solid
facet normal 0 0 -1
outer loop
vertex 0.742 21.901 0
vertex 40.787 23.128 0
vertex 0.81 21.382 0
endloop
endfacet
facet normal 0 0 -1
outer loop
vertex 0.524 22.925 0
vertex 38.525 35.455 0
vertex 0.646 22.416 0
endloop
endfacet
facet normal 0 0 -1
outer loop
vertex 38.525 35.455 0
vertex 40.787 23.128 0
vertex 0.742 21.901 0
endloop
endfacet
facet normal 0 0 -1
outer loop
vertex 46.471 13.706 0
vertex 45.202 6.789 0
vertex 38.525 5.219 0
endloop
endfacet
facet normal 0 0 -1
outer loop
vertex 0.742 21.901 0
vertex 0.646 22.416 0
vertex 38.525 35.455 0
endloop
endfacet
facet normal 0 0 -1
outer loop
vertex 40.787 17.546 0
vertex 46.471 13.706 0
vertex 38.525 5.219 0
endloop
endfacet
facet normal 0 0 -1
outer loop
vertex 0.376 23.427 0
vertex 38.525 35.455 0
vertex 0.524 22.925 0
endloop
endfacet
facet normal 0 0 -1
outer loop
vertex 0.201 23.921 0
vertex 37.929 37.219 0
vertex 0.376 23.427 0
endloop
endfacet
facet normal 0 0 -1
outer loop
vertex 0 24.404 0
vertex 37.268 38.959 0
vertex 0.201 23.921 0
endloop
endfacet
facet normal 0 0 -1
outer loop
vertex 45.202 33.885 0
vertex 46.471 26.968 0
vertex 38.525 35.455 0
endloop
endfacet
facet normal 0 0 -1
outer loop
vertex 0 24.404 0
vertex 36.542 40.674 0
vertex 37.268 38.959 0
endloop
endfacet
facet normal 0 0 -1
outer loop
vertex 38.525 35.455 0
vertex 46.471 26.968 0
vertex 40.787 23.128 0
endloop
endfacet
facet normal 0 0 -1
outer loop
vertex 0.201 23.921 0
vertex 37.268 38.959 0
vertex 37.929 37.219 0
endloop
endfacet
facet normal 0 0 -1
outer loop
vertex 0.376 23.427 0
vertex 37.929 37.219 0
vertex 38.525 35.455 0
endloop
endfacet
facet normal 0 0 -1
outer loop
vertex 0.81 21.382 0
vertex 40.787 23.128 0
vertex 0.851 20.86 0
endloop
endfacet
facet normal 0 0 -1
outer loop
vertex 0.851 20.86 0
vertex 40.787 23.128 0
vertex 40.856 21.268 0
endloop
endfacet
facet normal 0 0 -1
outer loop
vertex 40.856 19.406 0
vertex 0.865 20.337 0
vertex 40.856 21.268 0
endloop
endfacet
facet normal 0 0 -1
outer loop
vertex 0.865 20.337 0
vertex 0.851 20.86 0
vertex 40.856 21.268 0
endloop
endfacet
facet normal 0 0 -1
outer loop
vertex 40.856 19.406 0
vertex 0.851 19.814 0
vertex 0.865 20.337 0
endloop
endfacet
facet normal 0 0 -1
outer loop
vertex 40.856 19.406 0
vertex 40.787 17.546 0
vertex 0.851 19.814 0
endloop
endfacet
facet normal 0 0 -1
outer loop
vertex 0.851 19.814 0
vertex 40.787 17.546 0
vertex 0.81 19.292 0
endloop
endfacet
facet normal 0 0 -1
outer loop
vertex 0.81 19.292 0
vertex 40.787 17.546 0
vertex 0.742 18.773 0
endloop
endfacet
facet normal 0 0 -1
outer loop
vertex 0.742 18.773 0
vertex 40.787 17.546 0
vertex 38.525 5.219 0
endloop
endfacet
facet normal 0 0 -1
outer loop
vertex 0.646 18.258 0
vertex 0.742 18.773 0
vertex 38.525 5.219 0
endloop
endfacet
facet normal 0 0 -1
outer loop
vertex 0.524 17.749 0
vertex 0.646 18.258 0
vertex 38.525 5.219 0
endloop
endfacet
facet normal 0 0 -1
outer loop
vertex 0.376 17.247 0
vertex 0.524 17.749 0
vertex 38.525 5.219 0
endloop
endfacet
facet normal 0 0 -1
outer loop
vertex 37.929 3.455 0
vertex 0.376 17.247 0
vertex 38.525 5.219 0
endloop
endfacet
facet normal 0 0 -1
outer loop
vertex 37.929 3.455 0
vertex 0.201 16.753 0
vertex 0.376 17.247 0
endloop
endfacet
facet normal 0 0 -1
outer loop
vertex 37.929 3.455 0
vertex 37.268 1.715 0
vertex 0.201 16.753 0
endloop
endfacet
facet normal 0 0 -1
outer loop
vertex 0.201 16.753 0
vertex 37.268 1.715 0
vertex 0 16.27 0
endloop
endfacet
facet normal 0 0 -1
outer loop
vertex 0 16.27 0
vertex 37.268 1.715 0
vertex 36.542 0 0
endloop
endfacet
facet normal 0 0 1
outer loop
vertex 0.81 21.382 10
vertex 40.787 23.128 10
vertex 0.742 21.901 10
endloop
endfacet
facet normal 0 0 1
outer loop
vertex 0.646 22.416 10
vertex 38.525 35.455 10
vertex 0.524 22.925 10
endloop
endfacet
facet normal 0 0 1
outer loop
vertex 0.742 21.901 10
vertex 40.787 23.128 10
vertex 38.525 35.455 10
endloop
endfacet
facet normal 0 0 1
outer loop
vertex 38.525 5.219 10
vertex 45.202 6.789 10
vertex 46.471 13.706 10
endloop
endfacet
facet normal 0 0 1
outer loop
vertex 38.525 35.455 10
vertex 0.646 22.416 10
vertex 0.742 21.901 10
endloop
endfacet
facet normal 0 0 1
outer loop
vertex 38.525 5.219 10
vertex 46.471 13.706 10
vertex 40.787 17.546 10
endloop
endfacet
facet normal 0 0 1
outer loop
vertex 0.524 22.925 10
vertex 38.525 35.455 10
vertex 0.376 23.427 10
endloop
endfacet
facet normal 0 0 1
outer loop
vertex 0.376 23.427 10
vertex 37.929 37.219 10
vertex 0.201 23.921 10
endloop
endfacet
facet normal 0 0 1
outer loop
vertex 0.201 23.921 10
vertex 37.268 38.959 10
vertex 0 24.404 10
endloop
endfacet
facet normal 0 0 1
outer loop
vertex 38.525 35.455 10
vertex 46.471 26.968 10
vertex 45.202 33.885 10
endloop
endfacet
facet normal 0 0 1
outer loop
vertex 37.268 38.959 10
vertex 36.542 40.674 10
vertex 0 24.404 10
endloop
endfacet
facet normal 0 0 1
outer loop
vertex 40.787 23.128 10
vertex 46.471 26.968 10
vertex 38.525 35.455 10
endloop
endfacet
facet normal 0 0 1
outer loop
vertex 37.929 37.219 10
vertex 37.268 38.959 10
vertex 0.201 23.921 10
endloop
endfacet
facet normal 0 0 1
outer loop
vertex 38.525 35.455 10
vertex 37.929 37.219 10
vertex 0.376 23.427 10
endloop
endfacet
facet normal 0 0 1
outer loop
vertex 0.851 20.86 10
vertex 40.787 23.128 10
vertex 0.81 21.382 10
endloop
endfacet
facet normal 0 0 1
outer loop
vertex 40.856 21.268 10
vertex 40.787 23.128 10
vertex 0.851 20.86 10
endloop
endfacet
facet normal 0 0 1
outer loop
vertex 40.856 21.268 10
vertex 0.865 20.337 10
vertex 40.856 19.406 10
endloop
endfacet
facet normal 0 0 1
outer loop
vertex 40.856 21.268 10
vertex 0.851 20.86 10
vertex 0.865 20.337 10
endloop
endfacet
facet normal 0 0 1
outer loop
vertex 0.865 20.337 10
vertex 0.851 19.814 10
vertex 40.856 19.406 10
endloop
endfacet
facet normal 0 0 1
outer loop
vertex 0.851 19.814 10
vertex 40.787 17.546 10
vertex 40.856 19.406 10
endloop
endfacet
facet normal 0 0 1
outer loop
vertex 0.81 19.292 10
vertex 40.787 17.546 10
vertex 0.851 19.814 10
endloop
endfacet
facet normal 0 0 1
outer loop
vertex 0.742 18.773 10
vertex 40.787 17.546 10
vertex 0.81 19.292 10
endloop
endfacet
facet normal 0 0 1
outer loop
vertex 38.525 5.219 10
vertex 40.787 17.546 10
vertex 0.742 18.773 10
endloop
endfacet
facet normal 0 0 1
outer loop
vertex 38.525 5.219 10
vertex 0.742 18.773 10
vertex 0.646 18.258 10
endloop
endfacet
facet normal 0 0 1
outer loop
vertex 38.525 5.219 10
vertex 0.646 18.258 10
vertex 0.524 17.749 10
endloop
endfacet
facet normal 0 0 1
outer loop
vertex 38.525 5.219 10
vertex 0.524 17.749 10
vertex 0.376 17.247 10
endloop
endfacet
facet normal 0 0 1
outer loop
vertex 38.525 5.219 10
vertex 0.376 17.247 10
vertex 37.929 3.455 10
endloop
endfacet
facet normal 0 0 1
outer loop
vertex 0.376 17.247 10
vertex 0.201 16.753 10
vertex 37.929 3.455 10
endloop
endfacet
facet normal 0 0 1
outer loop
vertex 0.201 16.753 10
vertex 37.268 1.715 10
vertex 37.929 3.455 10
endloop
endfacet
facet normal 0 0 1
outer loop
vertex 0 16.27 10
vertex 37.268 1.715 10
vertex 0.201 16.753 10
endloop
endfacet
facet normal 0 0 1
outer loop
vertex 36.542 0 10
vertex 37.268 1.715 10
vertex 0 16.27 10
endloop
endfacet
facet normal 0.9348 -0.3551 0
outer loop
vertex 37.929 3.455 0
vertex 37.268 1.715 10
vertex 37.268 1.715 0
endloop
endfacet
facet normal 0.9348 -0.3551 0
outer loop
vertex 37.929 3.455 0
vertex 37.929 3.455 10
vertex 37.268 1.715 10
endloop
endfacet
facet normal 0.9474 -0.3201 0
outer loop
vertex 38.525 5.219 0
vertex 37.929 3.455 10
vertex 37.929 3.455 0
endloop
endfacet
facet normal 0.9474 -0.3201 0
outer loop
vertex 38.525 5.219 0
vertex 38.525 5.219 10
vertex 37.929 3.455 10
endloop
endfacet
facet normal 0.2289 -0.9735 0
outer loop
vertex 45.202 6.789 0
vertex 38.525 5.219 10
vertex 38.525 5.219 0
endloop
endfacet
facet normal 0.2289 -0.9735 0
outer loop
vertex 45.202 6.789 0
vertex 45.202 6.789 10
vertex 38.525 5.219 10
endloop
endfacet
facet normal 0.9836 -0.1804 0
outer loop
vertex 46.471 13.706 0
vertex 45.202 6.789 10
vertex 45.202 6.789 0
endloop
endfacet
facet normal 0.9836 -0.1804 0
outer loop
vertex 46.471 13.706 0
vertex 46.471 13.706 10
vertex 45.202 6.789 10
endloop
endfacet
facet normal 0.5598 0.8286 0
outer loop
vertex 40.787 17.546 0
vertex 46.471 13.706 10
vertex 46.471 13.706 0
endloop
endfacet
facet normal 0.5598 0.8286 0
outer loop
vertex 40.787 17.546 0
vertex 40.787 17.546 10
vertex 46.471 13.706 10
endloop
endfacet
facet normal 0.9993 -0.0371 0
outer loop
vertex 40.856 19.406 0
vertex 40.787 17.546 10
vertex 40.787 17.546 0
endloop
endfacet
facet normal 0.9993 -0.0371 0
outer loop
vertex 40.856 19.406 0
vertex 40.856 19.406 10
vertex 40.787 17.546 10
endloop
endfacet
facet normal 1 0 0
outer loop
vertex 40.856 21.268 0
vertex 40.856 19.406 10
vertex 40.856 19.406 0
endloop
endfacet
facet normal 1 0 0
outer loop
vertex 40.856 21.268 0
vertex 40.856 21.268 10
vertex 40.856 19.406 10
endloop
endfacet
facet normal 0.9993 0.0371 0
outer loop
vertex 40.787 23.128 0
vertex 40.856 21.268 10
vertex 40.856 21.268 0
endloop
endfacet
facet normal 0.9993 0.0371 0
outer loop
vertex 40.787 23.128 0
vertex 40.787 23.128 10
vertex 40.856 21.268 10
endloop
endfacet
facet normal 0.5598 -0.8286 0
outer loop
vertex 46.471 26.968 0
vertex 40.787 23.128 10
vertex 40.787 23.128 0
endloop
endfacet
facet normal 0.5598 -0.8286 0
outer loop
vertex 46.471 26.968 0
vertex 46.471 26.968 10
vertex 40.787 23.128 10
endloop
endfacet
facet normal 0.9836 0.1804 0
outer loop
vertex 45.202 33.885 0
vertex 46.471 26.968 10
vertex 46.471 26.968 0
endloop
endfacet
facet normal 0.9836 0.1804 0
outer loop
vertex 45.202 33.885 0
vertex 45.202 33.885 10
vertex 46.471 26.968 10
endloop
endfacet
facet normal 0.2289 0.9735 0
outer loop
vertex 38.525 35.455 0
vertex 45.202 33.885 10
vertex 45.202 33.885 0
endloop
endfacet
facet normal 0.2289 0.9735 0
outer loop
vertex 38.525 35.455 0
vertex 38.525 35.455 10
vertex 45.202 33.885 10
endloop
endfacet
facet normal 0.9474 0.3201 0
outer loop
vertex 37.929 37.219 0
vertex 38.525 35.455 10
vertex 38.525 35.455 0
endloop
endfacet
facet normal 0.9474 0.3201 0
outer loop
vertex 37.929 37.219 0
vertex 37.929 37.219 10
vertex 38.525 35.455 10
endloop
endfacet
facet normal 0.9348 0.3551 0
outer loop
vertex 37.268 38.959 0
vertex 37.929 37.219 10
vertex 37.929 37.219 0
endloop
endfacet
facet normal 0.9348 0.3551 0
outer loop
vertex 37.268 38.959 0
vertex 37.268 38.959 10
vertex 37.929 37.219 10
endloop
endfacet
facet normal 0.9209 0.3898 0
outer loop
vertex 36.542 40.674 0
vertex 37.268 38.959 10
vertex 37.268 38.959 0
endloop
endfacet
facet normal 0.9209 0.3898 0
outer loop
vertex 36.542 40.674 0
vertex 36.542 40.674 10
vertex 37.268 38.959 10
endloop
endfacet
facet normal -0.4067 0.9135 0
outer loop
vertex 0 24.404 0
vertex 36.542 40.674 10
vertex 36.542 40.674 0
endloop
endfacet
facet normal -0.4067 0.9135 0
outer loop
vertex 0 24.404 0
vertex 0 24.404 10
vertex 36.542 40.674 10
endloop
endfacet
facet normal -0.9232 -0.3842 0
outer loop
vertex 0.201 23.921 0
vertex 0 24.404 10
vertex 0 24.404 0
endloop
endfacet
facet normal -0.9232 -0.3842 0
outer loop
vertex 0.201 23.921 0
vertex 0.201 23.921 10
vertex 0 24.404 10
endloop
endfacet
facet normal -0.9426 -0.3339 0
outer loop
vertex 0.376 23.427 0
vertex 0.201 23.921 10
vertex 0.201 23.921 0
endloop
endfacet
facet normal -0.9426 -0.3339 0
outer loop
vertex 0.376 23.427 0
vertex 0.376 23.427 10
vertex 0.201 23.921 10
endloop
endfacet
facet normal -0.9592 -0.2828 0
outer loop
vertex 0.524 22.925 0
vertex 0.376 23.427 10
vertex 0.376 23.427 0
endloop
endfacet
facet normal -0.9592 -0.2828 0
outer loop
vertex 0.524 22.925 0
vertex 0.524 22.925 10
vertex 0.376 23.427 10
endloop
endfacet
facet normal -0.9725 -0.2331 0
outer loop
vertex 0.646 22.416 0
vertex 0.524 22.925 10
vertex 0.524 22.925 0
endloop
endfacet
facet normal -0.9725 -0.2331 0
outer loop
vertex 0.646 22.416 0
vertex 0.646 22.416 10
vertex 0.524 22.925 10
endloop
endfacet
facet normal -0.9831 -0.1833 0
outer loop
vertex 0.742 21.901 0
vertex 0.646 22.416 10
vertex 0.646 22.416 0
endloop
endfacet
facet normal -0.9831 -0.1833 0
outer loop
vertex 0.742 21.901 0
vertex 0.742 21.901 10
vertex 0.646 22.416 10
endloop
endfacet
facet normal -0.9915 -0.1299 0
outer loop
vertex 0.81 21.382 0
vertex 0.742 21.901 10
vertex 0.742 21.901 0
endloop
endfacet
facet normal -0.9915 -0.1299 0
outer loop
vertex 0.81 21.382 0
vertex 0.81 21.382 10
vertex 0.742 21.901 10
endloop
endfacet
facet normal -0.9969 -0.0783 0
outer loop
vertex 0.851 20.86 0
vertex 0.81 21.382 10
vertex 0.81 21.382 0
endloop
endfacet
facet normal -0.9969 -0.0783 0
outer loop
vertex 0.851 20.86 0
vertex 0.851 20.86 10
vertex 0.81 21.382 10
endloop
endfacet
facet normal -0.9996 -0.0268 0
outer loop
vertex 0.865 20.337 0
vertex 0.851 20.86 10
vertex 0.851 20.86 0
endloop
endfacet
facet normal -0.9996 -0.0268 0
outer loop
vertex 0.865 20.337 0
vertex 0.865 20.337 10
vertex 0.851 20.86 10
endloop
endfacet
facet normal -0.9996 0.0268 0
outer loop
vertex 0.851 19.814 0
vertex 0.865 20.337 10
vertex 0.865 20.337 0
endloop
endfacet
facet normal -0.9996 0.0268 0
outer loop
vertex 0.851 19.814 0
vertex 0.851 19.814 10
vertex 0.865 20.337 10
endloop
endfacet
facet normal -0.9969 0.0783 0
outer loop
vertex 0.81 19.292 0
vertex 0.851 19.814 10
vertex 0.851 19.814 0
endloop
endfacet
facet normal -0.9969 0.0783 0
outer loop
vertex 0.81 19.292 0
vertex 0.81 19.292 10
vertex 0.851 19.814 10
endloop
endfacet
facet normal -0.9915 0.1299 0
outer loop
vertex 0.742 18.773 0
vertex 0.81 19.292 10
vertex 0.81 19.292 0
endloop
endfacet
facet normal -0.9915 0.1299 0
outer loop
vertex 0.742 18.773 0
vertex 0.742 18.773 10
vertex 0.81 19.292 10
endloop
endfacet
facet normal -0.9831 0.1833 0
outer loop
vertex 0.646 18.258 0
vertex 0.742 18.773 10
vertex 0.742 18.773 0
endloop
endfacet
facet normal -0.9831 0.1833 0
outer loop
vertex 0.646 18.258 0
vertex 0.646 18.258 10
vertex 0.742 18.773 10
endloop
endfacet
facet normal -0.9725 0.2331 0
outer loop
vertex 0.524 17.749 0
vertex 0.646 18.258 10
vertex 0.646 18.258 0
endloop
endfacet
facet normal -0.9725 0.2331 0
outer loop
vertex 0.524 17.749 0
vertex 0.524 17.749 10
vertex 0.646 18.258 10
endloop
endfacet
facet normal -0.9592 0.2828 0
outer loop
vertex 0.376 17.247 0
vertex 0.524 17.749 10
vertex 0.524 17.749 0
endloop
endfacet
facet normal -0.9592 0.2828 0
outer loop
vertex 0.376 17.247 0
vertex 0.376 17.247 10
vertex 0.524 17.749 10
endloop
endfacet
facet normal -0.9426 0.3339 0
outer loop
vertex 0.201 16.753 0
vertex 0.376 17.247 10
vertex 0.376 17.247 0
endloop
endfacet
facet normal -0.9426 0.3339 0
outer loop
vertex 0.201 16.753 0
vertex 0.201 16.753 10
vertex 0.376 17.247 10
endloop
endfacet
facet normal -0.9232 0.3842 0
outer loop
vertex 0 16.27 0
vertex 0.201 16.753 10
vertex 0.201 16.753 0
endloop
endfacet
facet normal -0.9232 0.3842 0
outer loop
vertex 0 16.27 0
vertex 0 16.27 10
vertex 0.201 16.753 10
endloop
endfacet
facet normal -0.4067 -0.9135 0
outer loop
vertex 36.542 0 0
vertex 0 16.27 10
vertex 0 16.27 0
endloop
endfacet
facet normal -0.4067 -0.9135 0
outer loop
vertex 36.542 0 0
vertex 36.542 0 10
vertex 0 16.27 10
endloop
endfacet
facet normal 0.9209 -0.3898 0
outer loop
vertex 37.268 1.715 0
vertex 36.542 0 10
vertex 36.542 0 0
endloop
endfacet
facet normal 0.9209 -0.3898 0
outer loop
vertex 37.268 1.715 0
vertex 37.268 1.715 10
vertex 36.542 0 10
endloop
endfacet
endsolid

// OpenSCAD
$fn = 32;

// ----------------------------------------------------------------------
// Gear sector: 2 teeth on 48 degrees
// ----------------------------------------------------------------------

// --- parameters (mm) ---
sector_angle = 48;        // sector angle, degrees
root_r = 50;              // root circle radius
tooth_h = 6;              // tooth height over the root circle
teeth = 2;                // number of teeth on the sector
hub_r = 10;               // hub bore radius
plate_t = 10;             // sector thickness, Z
arc_step = 3;             // sampling step of the root/hub arcs, degrees

tip_r = root_r + tooth_h;  // tip circle radius

profile = [[36.542, 0], [37.268, 1.715], [37.929, 3.455], [38.525, 5.219], [45.202, 6.789], [46.471, 13.706], [40.787, 17.546], [40.856, 19.406], [40.856, 21.268], [40.787, 23.128], [46.471, 26.968], [45.202, 33.885], [38.525, 35.455], [37.929, 37.219], [37.268, 38.959], [36.542, 40.674], [0, 24.404], [0.201, 23.921], [0.376, 23.427], [0.524, 22.925], [0.646, 22.416], [0.742, 21.901], [0.81, 21.382], [0.851, 20.86], [0.865, 20.337], [0.851, 19.814], [0.81, 19.292], [0.742, 18.773], [0.646, 18.258], [0.524, 17.749], [0.376, 17.247], [0.201, 16.753], [0, 16.27]];  // primary outline, 33 points, counter clockwise

// --- the one profile operation ---
linear_extrude(height = plate_t) polygon(points = profile);
